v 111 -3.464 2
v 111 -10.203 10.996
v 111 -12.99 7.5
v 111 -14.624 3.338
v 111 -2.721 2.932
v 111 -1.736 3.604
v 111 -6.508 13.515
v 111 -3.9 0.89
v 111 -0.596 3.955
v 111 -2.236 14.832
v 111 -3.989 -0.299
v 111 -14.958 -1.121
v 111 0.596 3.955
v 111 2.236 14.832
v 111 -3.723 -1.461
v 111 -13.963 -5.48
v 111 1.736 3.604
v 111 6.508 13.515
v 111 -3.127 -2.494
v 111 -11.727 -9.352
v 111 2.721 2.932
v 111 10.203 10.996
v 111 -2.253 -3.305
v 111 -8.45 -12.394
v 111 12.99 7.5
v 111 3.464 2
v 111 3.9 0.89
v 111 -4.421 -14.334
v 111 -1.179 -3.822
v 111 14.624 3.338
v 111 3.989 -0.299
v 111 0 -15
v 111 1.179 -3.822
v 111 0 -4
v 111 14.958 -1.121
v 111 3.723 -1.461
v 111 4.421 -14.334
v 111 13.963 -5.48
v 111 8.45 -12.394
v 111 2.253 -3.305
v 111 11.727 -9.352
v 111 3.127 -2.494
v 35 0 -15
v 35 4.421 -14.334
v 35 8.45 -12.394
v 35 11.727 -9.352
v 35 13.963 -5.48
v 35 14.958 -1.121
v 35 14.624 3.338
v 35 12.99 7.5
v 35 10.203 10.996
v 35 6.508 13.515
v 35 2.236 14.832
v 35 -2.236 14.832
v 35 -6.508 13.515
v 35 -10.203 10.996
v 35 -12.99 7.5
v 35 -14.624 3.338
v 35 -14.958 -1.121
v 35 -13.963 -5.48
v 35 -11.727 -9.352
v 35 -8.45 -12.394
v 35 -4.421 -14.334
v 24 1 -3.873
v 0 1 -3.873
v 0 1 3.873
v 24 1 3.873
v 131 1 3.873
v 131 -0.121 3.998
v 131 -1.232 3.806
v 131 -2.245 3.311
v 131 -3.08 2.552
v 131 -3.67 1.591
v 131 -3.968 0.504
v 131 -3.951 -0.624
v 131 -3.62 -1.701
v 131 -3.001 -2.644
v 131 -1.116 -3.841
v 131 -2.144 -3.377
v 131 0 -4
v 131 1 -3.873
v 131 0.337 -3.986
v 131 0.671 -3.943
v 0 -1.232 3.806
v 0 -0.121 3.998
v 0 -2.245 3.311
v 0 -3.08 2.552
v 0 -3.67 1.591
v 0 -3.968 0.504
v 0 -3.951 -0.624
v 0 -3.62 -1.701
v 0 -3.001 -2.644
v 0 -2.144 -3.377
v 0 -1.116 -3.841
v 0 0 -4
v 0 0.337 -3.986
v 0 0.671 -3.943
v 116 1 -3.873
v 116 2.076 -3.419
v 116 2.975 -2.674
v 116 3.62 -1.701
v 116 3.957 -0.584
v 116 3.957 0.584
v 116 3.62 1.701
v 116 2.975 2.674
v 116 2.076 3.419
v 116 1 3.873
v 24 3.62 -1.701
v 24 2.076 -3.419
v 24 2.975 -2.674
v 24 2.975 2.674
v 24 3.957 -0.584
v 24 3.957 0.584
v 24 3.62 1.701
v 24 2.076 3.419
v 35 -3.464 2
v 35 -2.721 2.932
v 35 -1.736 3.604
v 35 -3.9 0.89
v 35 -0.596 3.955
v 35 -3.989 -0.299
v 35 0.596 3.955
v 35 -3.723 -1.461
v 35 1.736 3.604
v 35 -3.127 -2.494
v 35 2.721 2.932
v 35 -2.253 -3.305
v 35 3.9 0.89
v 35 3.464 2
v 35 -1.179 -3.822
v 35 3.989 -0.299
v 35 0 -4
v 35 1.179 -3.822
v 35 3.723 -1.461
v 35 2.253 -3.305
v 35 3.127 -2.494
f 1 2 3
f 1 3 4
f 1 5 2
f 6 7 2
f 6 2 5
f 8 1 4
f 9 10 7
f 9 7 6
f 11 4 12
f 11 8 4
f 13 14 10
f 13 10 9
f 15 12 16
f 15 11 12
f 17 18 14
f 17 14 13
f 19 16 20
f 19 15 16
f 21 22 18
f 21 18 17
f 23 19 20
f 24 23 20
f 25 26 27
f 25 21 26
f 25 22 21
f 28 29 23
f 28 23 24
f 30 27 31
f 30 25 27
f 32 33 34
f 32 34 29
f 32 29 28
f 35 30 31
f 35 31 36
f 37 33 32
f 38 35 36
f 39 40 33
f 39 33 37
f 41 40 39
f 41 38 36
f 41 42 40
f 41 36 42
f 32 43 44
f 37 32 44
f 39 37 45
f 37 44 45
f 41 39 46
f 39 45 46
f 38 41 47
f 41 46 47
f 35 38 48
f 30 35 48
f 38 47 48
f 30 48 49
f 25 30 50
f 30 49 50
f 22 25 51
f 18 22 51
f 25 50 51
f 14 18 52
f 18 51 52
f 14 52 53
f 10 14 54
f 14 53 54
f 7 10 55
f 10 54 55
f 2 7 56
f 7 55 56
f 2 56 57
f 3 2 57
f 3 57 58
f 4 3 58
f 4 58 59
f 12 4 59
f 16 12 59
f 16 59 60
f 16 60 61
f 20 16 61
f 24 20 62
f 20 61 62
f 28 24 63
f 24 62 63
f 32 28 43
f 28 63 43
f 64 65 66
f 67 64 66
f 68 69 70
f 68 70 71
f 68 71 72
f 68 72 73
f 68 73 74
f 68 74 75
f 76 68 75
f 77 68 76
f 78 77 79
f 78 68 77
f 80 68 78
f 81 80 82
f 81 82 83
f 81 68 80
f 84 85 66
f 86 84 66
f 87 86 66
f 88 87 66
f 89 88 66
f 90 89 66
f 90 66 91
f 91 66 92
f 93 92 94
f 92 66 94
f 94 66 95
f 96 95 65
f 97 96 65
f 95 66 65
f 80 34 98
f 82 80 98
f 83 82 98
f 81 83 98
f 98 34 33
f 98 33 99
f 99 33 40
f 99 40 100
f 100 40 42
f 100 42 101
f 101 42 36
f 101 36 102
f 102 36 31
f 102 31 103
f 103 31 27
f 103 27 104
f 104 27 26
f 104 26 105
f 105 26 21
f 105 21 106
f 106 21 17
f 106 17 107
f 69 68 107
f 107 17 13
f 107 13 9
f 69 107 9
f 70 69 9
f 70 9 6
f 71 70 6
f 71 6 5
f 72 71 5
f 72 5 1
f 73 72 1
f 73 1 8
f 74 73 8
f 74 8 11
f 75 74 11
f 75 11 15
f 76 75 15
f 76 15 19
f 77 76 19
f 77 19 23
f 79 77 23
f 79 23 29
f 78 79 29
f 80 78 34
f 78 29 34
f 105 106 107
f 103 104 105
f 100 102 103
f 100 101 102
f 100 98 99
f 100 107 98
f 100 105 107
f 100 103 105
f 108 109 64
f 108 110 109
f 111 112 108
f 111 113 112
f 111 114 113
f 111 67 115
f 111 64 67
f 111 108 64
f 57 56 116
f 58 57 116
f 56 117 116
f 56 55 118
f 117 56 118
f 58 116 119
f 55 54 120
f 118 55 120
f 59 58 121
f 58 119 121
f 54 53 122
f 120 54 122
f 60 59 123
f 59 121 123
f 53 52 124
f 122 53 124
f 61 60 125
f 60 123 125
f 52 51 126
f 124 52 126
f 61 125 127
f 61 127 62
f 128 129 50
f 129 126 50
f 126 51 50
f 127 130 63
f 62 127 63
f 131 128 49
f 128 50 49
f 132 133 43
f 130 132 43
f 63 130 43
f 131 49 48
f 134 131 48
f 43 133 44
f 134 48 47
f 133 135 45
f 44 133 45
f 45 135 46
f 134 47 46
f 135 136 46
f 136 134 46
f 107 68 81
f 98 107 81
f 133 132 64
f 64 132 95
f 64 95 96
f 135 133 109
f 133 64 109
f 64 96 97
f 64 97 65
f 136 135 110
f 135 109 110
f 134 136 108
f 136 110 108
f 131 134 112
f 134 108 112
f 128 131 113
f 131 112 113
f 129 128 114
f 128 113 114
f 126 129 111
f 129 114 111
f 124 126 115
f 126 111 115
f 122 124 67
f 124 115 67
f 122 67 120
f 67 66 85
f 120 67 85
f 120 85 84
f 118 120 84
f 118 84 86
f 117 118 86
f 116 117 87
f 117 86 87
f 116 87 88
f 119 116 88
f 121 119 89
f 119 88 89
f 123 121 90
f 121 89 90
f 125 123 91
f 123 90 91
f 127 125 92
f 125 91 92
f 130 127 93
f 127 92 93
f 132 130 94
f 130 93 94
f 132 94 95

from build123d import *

# Parameters (mm, degrees)
ESBO_O8_R                = 4
RESSALTO_EXTRUS_O4_DEPTH = 35
ESBO_O9_R                = 15
RESSALTO_EXTRUS_O5_DEPTH = 76
ESBO_O10_R               = 4
RESSALTO_EXTRUS_O6_DEPTH = 20
ESBO_O11_W               = 11.087956956
ESBO_O11_H               = 3
CORTE_EXTRUS_O1_DEPTH    = 24
ESBO_O12_W               = 18.763421195
ESBO_O12_H               = 3
CORTE_EXTRUS_O2_DEPTH    = 15


with BuildPart() as part:
    # Esboço8 → Ressalto-extrusão4 (new body)
    with BuildSketch(Plane(origin=(0, 0, 0), x_dir=(0, 0, -1), z_dir=(1, 0, 0))):
        Circle(ESBO_O8_R)
    extrude(amount=RESSALTO_EXTRUS_O4_DEPTH)

    # Esboço9 → Ressalto-extrusão5 (add)
    with BuildSketch(Plane(origin=(35, 0, 0), x_dir=(0, 0, -1), z_dir=(1, 0, 0))):
        Circle(ESBO_O9_R)
    extrude(amount=RESSALTO_EXTRUS_O5_DEPTH)

    # Esboço10 → Ressalto-extrusão6 (add)
    with BuildSketch(Plane(origin=(111, 0, 0), x_dir=(0, 0, -1), z_dir=(1, 0, 0))):
        Circle(ESBO_O10_R)
    extrude(amount=RESSALTO_EXTRUS_O6_DEPTH)

    # Esboço11 → Corte-extrusão1 (cut)
    with BuildSketch(Plane.ZY):
        with Locations((0, 2.5)):
            Rectangle(ESBO_O11_W, ESBO_O11_H)
    extrude(amount=-CORTE_EXTRUS_O1_DEPTH, mode=Mode.SUBTRACT)

    # Esboço12 → Corte-extrusão2 (cut)
    with BuildSketch(Plane(origin=(131, 0, 0), x_dir=(0, 0, -1), z_dir=(1, 0, 0))):
        with Locations((-0.1910881, 2.5)):
            Rectangle(ESBO_O12_W, ESBO_O12_H)
    extrude(amount=-CORTE_EXTRUS_O2_DEPTH, mode=Mode.SUBTRACT)


solid = part.part
